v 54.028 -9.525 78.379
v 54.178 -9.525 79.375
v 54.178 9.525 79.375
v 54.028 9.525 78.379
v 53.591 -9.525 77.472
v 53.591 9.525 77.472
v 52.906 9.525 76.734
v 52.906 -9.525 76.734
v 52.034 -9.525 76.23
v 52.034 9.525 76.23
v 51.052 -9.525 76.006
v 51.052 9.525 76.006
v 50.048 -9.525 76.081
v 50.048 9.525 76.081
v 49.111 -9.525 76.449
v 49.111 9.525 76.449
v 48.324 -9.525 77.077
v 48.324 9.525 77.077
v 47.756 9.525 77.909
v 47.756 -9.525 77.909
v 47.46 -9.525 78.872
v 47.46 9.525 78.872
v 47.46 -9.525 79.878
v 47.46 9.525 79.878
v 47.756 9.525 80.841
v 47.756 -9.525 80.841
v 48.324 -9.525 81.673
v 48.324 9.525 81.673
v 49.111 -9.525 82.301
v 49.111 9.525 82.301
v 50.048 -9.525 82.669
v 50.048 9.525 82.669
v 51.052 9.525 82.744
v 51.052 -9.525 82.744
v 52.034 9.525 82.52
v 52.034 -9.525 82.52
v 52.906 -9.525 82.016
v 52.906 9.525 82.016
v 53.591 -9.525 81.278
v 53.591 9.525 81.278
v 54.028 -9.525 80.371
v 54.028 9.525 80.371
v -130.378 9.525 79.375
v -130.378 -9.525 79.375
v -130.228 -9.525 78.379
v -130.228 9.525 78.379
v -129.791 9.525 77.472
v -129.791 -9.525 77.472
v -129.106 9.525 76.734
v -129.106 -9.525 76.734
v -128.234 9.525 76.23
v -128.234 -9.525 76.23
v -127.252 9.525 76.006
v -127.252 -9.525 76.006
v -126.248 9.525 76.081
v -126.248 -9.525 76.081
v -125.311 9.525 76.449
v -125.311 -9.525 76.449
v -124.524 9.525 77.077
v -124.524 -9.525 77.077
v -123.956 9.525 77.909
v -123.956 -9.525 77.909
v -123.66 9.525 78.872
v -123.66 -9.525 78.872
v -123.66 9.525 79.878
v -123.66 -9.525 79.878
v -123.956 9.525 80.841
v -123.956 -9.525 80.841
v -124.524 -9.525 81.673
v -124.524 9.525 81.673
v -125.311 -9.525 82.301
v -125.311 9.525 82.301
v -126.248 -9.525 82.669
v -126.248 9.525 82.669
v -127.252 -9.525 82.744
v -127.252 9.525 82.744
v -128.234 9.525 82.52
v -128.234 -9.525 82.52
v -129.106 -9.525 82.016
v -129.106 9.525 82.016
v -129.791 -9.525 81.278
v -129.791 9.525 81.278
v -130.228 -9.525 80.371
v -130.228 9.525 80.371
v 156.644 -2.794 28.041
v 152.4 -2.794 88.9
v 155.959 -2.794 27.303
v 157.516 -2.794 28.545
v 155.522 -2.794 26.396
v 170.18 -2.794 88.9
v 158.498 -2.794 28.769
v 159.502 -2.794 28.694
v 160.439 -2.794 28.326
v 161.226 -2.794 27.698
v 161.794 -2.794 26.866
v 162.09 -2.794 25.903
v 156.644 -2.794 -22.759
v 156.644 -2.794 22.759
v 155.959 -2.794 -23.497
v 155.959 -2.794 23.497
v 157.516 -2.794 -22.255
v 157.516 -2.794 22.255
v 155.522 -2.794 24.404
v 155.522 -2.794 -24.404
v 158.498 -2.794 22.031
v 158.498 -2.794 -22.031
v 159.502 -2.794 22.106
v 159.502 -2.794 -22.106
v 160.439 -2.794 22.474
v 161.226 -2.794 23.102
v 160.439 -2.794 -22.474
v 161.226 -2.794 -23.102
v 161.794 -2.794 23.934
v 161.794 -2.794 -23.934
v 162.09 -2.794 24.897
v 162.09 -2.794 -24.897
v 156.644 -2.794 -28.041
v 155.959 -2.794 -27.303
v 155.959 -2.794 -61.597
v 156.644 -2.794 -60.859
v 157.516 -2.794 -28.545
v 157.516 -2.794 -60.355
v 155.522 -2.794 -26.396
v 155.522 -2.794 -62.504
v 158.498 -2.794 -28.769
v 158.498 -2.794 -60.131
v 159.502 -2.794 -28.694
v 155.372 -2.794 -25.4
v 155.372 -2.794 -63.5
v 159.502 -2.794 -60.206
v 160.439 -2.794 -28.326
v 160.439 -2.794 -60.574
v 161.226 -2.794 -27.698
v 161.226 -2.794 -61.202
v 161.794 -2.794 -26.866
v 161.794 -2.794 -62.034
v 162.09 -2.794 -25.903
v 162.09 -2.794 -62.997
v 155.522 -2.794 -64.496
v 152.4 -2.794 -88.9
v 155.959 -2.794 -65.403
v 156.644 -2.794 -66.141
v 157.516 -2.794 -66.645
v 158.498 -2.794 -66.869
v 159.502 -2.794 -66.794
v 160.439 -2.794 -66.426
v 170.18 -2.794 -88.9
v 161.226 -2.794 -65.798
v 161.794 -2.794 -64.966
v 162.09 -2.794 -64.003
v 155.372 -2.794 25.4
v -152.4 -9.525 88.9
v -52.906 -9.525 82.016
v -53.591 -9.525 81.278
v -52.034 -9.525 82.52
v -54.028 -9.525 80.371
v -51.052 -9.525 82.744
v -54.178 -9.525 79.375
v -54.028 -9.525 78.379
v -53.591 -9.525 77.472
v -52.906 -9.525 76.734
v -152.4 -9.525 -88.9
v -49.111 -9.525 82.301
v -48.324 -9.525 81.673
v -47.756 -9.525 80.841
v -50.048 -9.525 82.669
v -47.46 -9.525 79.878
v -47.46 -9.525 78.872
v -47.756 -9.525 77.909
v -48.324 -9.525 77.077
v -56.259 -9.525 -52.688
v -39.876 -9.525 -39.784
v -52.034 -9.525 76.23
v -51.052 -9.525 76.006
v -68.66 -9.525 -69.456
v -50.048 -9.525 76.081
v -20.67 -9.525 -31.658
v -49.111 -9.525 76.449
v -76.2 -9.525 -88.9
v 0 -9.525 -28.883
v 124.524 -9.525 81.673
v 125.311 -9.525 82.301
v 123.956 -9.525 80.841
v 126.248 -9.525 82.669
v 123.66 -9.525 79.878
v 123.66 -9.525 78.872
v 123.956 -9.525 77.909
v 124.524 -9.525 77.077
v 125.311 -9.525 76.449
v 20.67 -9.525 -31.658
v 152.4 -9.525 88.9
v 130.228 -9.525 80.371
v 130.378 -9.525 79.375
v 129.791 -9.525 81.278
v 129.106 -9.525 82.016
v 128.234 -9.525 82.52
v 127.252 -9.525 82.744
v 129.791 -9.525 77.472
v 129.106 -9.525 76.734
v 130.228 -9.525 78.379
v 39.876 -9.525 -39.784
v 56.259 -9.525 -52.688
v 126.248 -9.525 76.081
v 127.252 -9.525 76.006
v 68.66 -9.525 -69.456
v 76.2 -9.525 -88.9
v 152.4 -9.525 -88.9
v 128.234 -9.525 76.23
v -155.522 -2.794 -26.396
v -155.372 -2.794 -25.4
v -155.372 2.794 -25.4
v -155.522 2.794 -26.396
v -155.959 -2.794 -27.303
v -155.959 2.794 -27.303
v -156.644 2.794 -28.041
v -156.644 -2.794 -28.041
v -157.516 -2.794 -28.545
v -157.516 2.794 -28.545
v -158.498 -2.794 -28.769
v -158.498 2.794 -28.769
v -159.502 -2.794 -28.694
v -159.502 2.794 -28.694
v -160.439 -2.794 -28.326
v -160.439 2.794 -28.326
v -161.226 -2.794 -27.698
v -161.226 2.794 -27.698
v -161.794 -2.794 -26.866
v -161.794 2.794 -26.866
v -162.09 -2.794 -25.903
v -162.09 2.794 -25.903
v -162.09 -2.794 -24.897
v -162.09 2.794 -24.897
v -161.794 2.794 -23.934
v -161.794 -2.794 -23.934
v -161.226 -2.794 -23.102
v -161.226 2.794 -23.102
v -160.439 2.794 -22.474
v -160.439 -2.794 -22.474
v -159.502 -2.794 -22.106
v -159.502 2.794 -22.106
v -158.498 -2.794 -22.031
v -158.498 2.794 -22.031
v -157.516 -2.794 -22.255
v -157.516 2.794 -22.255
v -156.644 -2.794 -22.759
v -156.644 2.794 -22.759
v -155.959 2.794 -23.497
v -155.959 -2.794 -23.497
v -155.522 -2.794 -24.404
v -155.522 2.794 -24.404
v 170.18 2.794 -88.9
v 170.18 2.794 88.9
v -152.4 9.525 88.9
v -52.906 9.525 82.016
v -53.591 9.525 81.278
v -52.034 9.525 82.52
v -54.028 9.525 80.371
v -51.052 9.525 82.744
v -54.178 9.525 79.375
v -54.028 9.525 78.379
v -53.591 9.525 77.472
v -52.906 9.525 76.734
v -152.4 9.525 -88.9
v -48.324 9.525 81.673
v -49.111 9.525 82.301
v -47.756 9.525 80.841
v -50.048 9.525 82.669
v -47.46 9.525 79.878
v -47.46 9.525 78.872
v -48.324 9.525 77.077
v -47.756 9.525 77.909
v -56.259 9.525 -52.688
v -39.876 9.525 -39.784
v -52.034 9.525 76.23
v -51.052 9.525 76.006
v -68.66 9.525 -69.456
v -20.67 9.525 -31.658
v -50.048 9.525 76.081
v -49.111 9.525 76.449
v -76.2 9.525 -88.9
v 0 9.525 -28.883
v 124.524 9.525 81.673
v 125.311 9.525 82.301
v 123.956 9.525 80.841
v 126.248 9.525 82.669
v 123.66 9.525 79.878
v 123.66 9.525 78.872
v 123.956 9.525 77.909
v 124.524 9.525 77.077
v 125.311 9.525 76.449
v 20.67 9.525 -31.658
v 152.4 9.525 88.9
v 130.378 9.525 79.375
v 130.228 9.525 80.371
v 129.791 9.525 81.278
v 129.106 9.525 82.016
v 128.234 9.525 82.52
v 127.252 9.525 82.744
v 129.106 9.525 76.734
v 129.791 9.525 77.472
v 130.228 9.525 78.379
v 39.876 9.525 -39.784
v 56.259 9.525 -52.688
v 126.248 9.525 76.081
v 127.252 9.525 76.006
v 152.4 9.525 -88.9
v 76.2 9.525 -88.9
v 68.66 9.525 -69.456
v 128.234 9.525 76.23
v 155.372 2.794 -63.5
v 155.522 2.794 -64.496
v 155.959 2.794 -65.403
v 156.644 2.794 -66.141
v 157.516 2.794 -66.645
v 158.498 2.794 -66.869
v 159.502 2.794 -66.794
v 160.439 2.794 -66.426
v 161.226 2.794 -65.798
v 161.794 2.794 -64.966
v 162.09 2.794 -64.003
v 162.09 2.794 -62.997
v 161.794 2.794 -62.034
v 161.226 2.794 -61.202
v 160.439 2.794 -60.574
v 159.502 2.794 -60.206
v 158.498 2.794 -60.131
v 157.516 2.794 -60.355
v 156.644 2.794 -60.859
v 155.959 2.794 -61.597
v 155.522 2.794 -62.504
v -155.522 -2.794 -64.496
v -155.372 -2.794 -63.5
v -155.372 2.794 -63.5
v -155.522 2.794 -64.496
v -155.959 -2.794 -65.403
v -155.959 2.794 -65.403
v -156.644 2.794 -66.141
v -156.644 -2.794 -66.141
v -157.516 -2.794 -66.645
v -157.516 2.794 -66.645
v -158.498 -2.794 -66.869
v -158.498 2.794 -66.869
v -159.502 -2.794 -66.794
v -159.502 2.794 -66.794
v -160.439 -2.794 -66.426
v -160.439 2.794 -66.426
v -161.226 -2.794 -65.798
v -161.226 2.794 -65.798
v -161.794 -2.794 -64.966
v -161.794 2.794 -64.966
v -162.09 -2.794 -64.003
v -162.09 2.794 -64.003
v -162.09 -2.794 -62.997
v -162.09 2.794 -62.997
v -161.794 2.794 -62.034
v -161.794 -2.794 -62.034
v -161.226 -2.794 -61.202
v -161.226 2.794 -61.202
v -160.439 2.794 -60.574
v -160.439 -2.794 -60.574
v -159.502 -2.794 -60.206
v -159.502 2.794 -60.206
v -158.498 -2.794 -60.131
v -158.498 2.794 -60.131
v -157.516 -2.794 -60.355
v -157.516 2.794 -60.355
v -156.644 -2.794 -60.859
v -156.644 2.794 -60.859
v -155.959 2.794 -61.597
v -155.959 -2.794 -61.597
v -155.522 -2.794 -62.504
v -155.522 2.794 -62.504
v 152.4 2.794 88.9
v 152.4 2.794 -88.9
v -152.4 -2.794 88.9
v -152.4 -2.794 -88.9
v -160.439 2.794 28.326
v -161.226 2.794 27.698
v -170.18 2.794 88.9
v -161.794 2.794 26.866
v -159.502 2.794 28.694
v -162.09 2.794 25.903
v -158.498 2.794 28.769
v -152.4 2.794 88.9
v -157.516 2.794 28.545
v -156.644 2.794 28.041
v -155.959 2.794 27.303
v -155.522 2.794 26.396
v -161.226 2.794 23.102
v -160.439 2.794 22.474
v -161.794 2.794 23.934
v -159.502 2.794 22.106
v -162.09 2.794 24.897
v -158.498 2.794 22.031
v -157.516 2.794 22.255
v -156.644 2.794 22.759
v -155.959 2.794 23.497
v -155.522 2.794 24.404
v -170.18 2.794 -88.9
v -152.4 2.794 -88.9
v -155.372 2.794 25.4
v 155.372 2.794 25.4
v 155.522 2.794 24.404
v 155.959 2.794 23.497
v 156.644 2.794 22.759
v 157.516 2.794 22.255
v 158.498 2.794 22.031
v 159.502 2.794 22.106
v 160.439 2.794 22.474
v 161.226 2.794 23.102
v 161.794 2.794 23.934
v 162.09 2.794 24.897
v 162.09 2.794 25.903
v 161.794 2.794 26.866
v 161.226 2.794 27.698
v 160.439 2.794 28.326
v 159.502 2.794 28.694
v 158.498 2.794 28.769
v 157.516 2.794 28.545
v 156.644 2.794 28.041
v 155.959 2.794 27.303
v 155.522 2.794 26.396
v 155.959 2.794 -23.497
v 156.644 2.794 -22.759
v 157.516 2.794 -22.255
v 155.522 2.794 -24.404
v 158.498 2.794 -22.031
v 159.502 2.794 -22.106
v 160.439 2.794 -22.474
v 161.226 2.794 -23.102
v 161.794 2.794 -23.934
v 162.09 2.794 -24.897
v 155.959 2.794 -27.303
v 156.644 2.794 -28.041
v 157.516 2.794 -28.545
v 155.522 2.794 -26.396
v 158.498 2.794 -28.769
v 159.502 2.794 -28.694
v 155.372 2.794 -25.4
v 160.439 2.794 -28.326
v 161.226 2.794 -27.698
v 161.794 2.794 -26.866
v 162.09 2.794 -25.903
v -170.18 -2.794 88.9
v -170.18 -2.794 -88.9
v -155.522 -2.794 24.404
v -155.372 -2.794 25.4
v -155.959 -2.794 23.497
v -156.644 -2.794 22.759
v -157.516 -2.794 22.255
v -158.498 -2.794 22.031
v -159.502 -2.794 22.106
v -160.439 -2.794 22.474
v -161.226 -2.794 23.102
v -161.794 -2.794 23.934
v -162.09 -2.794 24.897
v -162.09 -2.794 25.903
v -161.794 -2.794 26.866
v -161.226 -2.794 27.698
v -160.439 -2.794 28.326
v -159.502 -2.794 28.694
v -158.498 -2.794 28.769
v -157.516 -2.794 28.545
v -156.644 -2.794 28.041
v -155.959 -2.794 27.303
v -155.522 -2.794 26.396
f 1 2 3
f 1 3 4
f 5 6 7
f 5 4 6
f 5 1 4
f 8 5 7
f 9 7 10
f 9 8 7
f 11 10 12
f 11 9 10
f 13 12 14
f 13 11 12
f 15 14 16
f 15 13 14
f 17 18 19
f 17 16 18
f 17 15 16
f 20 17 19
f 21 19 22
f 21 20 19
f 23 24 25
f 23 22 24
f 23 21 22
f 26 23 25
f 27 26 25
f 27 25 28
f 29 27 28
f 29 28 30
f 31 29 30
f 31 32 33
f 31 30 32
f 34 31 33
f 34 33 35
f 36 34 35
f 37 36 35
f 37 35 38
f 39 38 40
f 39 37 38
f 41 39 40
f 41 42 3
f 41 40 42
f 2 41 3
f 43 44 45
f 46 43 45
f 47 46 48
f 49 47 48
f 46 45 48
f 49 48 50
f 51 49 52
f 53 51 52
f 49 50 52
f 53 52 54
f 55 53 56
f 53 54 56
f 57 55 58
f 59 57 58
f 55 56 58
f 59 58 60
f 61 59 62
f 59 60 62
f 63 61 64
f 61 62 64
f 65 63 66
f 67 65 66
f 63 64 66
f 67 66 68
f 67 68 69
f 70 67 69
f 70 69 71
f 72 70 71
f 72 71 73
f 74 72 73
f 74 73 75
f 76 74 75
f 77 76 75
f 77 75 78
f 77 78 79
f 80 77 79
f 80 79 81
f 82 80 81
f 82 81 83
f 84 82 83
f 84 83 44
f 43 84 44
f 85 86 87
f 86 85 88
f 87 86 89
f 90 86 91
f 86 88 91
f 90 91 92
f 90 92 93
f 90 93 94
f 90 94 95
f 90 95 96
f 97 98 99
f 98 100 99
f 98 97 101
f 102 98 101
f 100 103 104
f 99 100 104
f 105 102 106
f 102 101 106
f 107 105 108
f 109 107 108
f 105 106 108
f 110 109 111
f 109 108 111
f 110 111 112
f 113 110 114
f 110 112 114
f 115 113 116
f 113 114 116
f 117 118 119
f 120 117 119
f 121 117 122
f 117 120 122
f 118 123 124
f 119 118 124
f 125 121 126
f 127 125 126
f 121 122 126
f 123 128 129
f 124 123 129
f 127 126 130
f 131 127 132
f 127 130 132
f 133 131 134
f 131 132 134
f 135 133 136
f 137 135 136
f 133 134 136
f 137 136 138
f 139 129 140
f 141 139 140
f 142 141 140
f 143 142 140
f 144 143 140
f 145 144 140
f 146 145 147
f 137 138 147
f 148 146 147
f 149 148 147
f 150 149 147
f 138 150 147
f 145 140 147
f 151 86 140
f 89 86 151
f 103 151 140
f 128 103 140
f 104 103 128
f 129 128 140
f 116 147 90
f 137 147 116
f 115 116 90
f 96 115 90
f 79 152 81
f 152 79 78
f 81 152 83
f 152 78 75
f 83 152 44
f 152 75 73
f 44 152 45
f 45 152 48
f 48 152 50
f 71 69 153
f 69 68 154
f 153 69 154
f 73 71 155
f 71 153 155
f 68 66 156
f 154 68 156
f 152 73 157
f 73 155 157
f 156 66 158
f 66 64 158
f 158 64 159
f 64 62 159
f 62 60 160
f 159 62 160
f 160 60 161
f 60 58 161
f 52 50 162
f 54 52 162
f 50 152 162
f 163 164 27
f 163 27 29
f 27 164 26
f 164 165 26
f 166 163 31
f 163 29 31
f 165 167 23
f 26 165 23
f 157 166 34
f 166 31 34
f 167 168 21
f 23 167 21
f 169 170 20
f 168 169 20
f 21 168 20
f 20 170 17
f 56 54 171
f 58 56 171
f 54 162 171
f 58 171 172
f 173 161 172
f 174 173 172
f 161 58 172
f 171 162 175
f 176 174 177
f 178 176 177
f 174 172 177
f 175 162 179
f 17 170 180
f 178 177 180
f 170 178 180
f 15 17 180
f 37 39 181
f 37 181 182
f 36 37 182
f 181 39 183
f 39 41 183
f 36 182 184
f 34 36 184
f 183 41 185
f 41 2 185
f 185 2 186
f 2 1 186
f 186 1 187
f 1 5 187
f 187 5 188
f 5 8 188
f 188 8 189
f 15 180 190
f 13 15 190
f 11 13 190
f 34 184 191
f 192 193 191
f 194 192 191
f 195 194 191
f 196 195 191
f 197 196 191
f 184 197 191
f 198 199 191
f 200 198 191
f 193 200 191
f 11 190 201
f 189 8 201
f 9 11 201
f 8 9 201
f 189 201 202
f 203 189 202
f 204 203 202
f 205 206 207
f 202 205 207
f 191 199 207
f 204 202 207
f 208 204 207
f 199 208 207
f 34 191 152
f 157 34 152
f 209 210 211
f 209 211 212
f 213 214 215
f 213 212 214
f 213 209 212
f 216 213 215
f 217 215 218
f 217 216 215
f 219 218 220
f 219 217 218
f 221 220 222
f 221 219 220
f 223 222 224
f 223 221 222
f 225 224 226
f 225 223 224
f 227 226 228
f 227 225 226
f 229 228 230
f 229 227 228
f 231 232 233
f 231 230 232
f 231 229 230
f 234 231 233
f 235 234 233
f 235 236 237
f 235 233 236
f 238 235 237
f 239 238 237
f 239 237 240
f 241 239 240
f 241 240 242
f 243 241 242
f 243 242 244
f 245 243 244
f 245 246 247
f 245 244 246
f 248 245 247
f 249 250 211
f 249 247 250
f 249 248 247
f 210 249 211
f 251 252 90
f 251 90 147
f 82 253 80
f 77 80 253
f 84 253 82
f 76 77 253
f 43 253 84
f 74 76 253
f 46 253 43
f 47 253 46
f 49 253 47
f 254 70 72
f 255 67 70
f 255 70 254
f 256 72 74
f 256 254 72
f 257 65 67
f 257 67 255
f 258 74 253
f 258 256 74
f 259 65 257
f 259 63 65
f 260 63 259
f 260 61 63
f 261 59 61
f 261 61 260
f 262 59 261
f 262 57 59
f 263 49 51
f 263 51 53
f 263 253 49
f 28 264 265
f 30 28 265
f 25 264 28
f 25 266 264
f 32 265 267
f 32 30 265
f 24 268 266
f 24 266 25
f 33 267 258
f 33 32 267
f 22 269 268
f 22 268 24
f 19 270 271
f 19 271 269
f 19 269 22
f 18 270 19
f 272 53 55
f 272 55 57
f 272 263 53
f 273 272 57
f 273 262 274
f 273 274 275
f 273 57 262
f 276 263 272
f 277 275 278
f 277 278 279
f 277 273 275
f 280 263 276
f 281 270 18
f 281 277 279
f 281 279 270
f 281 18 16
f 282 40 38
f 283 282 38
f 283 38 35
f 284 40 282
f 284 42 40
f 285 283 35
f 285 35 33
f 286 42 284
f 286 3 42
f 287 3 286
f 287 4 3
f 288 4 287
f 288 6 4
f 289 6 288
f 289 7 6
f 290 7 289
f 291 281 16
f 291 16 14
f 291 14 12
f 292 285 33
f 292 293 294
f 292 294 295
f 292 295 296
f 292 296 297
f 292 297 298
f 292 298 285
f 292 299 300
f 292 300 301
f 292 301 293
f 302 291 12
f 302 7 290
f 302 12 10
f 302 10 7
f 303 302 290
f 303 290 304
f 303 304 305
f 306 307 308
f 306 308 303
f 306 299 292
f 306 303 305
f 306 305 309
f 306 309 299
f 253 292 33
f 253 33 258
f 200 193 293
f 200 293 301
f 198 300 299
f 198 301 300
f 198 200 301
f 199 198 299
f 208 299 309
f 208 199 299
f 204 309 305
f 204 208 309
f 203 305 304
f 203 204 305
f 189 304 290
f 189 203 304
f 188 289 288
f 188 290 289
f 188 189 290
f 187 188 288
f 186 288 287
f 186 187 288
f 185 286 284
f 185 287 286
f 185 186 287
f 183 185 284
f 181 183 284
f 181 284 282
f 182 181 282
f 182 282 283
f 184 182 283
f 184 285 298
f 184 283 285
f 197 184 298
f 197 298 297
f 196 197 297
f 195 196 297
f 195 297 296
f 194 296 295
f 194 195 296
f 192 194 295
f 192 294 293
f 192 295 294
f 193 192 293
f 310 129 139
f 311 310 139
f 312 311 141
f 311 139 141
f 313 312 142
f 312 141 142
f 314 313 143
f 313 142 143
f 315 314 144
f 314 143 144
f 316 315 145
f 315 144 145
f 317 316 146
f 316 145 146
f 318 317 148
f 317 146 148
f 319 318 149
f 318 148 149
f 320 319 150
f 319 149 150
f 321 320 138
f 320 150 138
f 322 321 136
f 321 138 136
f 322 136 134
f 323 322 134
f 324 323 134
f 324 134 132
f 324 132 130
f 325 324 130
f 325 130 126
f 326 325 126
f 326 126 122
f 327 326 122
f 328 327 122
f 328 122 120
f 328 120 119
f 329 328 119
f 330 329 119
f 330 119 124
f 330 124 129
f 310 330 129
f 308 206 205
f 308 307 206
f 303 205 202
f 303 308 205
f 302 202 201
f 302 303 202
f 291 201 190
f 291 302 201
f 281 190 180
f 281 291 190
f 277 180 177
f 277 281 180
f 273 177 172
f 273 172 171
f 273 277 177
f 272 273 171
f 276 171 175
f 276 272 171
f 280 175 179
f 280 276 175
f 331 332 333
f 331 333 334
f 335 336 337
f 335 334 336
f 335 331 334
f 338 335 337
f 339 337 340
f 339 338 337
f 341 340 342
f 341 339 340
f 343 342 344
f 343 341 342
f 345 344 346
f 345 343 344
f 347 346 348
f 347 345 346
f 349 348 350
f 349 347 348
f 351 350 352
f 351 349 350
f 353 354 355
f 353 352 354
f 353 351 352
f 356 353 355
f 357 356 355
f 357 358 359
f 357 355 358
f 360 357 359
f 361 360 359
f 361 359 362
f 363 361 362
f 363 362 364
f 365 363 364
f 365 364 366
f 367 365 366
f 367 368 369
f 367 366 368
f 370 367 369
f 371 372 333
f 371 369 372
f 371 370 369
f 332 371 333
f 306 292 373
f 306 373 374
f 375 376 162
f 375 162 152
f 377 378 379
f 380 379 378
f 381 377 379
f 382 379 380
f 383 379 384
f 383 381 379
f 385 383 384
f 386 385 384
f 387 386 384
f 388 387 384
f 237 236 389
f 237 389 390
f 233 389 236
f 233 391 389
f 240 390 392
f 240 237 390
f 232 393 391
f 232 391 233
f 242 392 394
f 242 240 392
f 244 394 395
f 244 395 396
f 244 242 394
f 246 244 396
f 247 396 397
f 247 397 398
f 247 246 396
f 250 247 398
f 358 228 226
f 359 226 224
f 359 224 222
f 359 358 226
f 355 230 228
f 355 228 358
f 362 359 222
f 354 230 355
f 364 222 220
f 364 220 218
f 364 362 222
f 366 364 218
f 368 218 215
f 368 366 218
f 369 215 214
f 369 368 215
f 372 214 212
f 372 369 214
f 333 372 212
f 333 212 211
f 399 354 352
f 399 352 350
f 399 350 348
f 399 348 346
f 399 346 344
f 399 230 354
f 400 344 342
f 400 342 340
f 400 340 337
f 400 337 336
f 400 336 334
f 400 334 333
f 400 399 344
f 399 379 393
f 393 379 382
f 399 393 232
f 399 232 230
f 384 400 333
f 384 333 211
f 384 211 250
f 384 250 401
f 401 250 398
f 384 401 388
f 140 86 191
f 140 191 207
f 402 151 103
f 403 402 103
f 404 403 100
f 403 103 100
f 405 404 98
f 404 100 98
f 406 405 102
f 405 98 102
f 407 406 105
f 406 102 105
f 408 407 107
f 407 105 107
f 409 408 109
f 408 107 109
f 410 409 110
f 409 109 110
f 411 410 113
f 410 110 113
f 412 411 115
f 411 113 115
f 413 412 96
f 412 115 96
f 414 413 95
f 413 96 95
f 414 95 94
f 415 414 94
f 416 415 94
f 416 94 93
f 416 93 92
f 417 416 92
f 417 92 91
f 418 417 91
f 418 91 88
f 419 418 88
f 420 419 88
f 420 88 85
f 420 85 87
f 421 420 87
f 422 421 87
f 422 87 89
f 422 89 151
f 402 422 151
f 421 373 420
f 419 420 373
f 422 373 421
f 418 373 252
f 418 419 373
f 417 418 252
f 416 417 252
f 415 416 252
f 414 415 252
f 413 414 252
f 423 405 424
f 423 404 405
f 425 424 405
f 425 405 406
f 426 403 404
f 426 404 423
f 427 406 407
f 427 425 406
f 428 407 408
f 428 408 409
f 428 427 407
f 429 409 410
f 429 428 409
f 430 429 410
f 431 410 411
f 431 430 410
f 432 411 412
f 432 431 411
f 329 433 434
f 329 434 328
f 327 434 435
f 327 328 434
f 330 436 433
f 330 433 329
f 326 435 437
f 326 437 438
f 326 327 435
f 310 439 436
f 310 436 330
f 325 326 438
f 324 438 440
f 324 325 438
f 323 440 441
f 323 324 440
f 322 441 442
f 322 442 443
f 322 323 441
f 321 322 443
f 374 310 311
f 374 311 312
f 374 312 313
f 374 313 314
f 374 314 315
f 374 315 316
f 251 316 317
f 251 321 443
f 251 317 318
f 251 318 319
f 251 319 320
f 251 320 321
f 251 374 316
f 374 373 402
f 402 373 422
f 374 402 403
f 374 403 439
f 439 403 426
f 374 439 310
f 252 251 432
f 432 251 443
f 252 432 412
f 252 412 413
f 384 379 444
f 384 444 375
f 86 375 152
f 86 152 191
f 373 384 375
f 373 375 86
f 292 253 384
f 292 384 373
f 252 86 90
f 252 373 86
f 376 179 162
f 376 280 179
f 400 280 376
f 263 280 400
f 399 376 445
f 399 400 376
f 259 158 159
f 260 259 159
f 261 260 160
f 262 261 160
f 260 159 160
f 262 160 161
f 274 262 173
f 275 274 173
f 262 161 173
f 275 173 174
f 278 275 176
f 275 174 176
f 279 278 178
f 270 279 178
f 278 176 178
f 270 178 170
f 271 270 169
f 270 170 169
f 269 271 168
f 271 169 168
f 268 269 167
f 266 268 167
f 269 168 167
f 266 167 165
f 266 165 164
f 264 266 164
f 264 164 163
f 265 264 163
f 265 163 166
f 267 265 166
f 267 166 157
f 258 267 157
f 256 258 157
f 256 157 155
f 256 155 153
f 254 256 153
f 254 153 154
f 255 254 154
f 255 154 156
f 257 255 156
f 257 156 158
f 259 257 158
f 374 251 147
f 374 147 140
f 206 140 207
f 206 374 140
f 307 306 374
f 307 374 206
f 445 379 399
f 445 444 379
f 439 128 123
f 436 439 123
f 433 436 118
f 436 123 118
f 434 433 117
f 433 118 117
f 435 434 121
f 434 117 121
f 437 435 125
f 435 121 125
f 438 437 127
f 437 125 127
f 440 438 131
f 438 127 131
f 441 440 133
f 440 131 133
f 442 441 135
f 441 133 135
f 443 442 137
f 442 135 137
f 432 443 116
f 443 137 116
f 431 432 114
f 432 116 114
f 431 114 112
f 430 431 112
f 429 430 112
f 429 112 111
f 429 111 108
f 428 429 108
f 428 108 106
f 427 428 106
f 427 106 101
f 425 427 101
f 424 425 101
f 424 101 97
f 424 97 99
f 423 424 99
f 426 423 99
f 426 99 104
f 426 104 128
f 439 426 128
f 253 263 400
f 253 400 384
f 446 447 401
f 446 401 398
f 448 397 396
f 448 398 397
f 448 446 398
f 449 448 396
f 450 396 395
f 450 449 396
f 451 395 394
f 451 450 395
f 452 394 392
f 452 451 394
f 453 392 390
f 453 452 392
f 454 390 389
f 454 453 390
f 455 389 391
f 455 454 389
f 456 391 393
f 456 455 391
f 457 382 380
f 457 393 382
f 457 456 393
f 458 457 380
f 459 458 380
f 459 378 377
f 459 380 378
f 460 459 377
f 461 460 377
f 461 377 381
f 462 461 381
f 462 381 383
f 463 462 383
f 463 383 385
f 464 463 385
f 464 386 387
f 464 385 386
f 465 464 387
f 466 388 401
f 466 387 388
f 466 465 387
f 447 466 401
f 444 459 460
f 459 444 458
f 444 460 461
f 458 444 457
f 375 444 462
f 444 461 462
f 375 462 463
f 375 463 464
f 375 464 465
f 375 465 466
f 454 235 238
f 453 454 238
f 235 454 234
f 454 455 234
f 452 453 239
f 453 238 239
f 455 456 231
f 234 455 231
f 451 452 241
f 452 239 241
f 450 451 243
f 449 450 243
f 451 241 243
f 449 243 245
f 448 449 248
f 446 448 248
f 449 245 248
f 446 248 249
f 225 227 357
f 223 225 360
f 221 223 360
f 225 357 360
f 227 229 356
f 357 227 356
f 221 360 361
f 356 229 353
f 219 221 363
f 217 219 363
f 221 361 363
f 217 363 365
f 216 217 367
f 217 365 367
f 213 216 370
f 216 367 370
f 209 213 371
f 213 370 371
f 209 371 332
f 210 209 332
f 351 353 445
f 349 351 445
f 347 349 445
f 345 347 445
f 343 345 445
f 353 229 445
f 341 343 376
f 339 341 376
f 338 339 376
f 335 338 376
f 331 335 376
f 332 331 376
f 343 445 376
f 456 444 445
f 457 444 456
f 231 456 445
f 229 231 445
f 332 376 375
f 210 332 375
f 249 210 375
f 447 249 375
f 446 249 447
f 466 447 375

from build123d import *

# Parameters (mm, degrees)
BOSS_EXTRUDE1_DEPTH     = 9.525
SKETCH2_W               = 17.78
SKETCH2_H               = 177.8
BOSS_EXTRUDE2_DEPTH     = 2.794
F_1_4_CLEARANCE_HOLE1_D = 6.7564
F_1_4_CLEARANCE_HOLE2_D = 6.7564


with BuildPart() as part:
    # Sketch1 → Boss-Extrude1 (new, symmetric)
    with BuildSketch(Plane(origin=(0, 0, 0), x_dir=(1, 0, 0), z_dir=(0, 1, 0))):
        with BuildLine():
            Line((-76.2, 88.9), (-152.4, 88.9))
            Line((-152.4, 88.9), (-152.4, -88.9))
            Line((-152.4, -88.9), (152.4, -88.9))
            Line((152.4, -88.9), (152.4, 88.9))
            Line((152.4, 88.9), (76.2, 88.9))
            ThreePointArc((76.2, 88.9), (0, 28.883239197), (-76.2, 88.9))
        make_face()
    extrude(amount=BOSS_EXTRUDE1_DEPTH, both=True)

    # Sketch2 → Boss-Extrude2 (add, symmetric)
    with BuildSketch(Plane(origin=(0, 0, 0), x_dir=(1, 0, 0), z_dir=(0, 1, 0))):
        with Locations((-161.29, 0)):
            Rectangle(SKETCH2_W, SKETCH2_H)
        with Locations((161.29, 0)):
            Rectangle(SKETCH2_W, SKETCH2_H)
    extrude(amount=BOSS_EXTRUDE2_DEPTH, both=True)

    # 1/4 Clearance Hole1 (through all)
    with Locations(Plane(origin=(0, 2.794, 0), x_dir=(1, 0, 0), z_dir=(0, 1, 0))):
        with Locations((158.75, 63.5), (158.75, 25.4), (158.75, -25.4)):
            f_1_4_clearance_hole1 = Hole(F_1_4_CLEARANCE_HOLE1_D / 2)

    # Mirror1: 1/4 Clearance Hole1 across plane
    add(f_1_4_clearance_hole1.mirror(Plane(origin=(0, 0, 0), x_dir=(0, 0, 1), z_dir=(1, 0, 0))), mode=Mode.SUBTRACT)

    # 1/4 Clearance Hole2 (through all)
    with Locations(Plane(origin=(0, 9.525, 0), x_dir=(1, 0, 0), z_dir=(0, 1, 0))):
        with Locations((-127, -79.375), (-50.8, -79.375)):
            f_1_4_clearance_hole2 = Hole(F_1_4_CLEARANCE_HOLE2_D / 2)

    # Mirror2: 1/4 Clearance Hole2 across plane
    add(f_1_4_clearance_hole2.mirror(Plane(origin=(0, 0, 0), x_dir=(0, 0, 1), z_dir=(1, 0, 0))), mode=Mode.SUBTRACT)


solid = part.part
